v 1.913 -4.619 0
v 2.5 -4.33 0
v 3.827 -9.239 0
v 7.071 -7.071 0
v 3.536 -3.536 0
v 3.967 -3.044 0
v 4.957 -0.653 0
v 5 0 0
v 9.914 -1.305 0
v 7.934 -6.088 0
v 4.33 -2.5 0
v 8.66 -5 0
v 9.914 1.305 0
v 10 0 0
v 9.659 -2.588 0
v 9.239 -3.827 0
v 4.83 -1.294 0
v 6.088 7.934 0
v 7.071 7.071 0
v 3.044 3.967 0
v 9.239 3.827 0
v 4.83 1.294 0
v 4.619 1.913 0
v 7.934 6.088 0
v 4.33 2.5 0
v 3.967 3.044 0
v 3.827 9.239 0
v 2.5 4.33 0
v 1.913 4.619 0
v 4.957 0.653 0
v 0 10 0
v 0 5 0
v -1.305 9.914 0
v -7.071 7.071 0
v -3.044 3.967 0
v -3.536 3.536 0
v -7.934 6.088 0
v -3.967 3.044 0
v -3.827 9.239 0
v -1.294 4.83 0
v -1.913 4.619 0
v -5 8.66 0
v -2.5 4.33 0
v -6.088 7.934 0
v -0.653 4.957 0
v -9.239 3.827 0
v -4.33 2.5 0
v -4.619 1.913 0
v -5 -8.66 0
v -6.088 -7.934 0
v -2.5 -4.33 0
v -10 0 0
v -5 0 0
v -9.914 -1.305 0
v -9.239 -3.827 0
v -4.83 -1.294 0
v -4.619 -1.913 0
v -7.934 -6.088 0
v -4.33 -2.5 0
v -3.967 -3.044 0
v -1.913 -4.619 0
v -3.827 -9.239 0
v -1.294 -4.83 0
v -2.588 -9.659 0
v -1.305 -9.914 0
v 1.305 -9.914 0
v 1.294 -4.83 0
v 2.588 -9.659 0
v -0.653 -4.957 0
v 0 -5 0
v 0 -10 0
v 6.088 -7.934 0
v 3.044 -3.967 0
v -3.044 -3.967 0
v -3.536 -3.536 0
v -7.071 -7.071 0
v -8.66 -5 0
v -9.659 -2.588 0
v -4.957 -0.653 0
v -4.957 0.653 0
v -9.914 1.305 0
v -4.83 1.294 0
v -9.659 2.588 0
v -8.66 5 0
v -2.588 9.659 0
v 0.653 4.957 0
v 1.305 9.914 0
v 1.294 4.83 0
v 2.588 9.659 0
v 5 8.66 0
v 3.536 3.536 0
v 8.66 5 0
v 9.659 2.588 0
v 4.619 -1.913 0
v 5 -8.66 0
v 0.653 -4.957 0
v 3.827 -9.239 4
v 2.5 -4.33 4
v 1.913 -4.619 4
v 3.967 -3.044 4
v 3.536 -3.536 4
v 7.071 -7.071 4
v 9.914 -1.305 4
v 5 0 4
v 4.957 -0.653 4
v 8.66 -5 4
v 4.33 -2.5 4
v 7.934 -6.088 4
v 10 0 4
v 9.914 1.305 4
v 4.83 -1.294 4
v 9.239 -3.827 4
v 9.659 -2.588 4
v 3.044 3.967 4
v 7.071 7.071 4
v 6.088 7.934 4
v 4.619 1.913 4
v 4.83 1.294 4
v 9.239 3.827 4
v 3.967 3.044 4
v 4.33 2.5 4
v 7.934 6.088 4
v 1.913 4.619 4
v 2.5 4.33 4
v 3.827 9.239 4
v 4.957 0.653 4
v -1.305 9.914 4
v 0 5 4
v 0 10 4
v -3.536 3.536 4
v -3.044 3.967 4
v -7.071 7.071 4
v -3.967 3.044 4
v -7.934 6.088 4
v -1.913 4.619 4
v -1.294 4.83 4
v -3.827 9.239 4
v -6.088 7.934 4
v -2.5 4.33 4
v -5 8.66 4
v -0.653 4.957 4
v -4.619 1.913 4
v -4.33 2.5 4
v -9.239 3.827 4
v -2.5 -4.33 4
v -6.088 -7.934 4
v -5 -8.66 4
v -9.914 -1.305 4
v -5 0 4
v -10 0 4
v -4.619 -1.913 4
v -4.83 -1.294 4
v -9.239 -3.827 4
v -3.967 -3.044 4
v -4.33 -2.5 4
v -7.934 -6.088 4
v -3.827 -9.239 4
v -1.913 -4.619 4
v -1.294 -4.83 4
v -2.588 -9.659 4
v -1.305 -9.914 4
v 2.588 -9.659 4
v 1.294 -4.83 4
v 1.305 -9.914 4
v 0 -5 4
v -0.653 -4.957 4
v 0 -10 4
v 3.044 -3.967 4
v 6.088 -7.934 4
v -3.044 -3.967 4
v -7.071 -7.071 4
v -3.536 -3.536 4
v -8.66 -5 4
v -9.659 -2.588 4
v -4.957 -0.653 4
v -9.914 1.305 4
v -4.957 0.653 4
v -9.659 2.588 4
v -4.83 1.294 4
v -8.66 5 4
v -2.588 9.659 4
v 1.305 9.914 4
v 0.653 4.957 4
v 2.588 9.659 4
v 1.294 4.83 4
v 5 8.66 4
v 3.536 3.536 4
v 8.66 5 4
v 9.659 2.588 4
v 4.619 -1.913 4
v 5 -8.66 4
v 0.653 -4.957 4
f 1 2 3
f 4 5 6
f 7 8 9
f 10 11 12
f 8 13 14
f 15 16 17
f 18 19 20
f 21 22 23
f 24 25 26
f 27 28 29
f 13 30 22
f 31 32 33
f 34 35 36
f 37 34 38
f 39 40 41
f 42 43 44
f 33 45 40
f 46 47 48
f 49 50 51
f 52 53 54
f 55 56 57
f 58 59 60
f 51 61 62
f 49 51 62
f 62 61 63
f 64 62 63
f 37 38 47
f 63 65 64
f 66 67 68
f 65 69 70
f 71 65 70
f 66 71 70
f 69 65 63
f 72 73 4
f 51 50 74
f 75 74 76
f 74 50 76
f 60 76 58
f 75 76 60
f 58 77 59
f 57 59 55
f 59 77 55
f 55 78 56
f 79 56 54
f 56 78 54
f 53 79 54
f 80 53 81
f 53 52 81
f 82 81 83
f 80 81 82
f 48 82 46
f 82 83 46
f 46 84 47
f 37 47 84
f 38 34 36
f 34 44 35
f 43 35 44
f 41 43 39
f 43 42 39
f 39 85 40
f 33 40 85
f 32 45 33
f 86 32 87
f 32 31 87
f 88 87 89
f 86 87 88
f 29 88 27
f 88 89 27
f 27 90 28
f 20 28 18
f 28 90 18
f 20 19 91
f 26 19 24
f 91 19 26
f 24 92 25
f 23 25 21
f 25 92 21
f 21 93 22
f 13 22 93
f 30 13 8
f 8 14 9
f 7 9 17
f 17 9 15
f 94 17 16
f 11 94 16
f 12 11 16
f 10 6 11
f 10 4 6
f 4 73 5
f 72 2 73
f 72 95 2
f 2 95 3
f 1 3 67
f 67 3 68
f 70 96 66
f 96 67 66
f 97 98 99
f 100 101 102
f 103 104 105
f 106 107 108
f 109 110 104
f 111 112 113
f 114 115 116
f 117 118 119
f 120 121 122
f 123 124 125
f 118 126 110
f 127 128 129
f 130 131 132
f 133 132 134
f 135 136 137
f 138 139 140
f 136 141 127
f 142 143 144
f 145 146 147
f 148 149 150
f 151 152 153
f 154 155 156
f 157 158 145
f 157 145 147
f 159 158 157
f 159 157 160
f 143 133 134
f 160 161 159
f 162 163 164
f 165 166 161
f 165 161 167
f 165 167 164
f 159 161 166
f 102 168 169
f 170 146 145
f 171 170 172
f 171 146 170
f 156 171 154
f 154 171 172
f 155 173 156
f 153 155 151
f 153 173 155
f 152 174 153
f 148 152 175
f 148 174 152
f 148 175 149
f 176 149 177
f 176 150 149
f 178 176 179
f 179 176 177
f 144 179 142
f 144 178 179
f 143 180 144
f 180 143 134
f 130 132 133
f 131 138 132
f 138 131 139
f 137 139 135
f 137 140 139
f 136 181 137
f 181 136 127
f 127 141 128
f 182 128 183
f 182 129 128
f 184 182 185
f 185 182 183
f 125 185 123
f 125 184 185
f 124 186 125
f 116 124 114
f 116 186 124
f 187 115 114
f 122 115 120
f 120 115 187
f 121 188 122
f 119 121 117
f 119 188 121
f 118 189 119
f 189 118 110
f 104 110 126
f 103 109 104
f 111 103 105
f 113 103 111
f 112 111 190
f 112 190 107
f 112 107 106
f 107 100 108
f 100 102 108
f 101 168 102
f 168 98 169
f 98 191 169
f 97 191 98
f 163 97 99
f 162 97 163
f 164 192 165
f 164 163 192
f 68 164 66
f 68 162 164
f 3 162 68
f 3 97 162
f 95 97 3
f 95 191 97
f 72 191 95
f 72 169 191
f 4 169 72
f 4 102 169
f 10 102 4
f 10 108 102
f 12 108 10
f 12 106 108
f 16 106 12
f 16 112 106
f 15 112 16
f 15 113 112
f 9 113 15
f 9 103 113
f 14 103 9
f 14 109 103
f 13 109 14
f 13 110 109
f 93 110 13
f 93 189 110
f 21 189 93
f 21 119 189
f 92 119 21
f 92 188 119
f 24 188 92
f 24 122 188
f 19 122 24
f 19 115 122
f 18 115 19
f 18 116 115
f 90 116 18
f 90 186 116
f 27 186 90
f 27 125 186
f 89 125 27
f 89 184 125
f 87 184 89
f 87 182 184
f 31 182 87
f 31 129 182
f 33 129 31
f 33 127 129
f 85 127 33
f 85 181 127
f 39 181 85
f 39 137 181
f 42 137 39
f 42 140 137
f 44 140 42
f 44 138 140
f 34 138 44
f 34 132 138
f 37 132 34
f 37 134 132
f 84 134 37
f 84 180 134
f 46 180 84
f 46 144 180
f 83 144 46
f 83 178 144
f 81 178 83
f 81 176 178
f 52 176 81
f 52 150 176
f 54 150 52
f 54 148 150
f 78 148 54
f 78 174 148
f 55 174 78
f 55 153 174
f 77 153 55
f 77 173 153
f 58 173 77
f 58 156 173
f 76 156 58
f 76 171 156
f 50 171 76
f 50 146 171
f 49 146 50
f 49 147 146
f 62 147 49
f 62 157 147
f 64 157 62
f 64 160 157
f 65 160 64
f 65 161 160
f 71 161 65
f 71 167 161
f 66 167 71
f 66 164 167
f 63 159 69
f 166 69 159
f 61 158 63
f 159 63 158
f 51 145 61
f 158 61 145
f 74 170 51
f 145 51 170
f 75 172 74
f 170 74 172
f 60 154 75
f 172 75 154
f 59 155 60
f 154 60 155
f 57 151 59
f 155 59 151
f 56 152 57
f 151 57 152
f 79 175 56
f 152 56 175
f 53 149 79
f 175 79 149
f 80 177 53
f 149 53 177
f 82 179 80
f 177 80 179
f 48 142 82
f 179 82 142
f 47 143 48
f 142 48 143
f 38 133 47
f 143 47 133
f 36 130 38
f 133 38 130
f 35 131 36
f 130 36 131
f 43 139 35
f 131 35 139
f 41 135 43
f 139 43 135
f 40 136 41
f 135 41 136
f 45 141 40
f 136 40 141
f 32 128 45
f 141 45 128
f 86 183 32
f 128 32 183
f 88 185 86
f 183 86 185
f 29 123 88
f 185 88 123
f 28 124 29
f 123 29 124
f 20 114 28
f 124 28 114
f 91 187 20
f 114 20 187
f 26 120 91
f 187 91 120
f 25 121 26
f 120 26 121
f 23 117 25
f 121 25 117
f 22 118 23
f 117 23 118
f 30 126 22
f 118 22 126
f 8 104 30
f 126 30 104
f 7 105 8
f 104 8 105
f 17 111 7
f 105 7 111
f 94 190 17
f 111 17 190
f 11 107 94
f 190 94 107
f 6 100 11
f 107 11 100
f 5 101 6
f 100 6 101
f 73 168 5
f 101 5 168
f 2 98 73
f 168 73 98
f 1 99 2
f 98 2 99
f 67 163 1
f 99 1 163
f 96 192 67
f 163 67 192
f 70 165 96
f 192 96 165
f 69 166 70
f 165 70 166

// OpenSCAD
// D5 — a multi-loop profile. The inner rim only survives if cap membership comes
// from geometry rather than from a presumed ring layout: inferring the layer
// from the vertex index files the side wall into the caps, and both rims cancel.
linear_extrude(4) difference() {
  circle(10, $fn = 48);
  circle(5, $fn = 48);
}
